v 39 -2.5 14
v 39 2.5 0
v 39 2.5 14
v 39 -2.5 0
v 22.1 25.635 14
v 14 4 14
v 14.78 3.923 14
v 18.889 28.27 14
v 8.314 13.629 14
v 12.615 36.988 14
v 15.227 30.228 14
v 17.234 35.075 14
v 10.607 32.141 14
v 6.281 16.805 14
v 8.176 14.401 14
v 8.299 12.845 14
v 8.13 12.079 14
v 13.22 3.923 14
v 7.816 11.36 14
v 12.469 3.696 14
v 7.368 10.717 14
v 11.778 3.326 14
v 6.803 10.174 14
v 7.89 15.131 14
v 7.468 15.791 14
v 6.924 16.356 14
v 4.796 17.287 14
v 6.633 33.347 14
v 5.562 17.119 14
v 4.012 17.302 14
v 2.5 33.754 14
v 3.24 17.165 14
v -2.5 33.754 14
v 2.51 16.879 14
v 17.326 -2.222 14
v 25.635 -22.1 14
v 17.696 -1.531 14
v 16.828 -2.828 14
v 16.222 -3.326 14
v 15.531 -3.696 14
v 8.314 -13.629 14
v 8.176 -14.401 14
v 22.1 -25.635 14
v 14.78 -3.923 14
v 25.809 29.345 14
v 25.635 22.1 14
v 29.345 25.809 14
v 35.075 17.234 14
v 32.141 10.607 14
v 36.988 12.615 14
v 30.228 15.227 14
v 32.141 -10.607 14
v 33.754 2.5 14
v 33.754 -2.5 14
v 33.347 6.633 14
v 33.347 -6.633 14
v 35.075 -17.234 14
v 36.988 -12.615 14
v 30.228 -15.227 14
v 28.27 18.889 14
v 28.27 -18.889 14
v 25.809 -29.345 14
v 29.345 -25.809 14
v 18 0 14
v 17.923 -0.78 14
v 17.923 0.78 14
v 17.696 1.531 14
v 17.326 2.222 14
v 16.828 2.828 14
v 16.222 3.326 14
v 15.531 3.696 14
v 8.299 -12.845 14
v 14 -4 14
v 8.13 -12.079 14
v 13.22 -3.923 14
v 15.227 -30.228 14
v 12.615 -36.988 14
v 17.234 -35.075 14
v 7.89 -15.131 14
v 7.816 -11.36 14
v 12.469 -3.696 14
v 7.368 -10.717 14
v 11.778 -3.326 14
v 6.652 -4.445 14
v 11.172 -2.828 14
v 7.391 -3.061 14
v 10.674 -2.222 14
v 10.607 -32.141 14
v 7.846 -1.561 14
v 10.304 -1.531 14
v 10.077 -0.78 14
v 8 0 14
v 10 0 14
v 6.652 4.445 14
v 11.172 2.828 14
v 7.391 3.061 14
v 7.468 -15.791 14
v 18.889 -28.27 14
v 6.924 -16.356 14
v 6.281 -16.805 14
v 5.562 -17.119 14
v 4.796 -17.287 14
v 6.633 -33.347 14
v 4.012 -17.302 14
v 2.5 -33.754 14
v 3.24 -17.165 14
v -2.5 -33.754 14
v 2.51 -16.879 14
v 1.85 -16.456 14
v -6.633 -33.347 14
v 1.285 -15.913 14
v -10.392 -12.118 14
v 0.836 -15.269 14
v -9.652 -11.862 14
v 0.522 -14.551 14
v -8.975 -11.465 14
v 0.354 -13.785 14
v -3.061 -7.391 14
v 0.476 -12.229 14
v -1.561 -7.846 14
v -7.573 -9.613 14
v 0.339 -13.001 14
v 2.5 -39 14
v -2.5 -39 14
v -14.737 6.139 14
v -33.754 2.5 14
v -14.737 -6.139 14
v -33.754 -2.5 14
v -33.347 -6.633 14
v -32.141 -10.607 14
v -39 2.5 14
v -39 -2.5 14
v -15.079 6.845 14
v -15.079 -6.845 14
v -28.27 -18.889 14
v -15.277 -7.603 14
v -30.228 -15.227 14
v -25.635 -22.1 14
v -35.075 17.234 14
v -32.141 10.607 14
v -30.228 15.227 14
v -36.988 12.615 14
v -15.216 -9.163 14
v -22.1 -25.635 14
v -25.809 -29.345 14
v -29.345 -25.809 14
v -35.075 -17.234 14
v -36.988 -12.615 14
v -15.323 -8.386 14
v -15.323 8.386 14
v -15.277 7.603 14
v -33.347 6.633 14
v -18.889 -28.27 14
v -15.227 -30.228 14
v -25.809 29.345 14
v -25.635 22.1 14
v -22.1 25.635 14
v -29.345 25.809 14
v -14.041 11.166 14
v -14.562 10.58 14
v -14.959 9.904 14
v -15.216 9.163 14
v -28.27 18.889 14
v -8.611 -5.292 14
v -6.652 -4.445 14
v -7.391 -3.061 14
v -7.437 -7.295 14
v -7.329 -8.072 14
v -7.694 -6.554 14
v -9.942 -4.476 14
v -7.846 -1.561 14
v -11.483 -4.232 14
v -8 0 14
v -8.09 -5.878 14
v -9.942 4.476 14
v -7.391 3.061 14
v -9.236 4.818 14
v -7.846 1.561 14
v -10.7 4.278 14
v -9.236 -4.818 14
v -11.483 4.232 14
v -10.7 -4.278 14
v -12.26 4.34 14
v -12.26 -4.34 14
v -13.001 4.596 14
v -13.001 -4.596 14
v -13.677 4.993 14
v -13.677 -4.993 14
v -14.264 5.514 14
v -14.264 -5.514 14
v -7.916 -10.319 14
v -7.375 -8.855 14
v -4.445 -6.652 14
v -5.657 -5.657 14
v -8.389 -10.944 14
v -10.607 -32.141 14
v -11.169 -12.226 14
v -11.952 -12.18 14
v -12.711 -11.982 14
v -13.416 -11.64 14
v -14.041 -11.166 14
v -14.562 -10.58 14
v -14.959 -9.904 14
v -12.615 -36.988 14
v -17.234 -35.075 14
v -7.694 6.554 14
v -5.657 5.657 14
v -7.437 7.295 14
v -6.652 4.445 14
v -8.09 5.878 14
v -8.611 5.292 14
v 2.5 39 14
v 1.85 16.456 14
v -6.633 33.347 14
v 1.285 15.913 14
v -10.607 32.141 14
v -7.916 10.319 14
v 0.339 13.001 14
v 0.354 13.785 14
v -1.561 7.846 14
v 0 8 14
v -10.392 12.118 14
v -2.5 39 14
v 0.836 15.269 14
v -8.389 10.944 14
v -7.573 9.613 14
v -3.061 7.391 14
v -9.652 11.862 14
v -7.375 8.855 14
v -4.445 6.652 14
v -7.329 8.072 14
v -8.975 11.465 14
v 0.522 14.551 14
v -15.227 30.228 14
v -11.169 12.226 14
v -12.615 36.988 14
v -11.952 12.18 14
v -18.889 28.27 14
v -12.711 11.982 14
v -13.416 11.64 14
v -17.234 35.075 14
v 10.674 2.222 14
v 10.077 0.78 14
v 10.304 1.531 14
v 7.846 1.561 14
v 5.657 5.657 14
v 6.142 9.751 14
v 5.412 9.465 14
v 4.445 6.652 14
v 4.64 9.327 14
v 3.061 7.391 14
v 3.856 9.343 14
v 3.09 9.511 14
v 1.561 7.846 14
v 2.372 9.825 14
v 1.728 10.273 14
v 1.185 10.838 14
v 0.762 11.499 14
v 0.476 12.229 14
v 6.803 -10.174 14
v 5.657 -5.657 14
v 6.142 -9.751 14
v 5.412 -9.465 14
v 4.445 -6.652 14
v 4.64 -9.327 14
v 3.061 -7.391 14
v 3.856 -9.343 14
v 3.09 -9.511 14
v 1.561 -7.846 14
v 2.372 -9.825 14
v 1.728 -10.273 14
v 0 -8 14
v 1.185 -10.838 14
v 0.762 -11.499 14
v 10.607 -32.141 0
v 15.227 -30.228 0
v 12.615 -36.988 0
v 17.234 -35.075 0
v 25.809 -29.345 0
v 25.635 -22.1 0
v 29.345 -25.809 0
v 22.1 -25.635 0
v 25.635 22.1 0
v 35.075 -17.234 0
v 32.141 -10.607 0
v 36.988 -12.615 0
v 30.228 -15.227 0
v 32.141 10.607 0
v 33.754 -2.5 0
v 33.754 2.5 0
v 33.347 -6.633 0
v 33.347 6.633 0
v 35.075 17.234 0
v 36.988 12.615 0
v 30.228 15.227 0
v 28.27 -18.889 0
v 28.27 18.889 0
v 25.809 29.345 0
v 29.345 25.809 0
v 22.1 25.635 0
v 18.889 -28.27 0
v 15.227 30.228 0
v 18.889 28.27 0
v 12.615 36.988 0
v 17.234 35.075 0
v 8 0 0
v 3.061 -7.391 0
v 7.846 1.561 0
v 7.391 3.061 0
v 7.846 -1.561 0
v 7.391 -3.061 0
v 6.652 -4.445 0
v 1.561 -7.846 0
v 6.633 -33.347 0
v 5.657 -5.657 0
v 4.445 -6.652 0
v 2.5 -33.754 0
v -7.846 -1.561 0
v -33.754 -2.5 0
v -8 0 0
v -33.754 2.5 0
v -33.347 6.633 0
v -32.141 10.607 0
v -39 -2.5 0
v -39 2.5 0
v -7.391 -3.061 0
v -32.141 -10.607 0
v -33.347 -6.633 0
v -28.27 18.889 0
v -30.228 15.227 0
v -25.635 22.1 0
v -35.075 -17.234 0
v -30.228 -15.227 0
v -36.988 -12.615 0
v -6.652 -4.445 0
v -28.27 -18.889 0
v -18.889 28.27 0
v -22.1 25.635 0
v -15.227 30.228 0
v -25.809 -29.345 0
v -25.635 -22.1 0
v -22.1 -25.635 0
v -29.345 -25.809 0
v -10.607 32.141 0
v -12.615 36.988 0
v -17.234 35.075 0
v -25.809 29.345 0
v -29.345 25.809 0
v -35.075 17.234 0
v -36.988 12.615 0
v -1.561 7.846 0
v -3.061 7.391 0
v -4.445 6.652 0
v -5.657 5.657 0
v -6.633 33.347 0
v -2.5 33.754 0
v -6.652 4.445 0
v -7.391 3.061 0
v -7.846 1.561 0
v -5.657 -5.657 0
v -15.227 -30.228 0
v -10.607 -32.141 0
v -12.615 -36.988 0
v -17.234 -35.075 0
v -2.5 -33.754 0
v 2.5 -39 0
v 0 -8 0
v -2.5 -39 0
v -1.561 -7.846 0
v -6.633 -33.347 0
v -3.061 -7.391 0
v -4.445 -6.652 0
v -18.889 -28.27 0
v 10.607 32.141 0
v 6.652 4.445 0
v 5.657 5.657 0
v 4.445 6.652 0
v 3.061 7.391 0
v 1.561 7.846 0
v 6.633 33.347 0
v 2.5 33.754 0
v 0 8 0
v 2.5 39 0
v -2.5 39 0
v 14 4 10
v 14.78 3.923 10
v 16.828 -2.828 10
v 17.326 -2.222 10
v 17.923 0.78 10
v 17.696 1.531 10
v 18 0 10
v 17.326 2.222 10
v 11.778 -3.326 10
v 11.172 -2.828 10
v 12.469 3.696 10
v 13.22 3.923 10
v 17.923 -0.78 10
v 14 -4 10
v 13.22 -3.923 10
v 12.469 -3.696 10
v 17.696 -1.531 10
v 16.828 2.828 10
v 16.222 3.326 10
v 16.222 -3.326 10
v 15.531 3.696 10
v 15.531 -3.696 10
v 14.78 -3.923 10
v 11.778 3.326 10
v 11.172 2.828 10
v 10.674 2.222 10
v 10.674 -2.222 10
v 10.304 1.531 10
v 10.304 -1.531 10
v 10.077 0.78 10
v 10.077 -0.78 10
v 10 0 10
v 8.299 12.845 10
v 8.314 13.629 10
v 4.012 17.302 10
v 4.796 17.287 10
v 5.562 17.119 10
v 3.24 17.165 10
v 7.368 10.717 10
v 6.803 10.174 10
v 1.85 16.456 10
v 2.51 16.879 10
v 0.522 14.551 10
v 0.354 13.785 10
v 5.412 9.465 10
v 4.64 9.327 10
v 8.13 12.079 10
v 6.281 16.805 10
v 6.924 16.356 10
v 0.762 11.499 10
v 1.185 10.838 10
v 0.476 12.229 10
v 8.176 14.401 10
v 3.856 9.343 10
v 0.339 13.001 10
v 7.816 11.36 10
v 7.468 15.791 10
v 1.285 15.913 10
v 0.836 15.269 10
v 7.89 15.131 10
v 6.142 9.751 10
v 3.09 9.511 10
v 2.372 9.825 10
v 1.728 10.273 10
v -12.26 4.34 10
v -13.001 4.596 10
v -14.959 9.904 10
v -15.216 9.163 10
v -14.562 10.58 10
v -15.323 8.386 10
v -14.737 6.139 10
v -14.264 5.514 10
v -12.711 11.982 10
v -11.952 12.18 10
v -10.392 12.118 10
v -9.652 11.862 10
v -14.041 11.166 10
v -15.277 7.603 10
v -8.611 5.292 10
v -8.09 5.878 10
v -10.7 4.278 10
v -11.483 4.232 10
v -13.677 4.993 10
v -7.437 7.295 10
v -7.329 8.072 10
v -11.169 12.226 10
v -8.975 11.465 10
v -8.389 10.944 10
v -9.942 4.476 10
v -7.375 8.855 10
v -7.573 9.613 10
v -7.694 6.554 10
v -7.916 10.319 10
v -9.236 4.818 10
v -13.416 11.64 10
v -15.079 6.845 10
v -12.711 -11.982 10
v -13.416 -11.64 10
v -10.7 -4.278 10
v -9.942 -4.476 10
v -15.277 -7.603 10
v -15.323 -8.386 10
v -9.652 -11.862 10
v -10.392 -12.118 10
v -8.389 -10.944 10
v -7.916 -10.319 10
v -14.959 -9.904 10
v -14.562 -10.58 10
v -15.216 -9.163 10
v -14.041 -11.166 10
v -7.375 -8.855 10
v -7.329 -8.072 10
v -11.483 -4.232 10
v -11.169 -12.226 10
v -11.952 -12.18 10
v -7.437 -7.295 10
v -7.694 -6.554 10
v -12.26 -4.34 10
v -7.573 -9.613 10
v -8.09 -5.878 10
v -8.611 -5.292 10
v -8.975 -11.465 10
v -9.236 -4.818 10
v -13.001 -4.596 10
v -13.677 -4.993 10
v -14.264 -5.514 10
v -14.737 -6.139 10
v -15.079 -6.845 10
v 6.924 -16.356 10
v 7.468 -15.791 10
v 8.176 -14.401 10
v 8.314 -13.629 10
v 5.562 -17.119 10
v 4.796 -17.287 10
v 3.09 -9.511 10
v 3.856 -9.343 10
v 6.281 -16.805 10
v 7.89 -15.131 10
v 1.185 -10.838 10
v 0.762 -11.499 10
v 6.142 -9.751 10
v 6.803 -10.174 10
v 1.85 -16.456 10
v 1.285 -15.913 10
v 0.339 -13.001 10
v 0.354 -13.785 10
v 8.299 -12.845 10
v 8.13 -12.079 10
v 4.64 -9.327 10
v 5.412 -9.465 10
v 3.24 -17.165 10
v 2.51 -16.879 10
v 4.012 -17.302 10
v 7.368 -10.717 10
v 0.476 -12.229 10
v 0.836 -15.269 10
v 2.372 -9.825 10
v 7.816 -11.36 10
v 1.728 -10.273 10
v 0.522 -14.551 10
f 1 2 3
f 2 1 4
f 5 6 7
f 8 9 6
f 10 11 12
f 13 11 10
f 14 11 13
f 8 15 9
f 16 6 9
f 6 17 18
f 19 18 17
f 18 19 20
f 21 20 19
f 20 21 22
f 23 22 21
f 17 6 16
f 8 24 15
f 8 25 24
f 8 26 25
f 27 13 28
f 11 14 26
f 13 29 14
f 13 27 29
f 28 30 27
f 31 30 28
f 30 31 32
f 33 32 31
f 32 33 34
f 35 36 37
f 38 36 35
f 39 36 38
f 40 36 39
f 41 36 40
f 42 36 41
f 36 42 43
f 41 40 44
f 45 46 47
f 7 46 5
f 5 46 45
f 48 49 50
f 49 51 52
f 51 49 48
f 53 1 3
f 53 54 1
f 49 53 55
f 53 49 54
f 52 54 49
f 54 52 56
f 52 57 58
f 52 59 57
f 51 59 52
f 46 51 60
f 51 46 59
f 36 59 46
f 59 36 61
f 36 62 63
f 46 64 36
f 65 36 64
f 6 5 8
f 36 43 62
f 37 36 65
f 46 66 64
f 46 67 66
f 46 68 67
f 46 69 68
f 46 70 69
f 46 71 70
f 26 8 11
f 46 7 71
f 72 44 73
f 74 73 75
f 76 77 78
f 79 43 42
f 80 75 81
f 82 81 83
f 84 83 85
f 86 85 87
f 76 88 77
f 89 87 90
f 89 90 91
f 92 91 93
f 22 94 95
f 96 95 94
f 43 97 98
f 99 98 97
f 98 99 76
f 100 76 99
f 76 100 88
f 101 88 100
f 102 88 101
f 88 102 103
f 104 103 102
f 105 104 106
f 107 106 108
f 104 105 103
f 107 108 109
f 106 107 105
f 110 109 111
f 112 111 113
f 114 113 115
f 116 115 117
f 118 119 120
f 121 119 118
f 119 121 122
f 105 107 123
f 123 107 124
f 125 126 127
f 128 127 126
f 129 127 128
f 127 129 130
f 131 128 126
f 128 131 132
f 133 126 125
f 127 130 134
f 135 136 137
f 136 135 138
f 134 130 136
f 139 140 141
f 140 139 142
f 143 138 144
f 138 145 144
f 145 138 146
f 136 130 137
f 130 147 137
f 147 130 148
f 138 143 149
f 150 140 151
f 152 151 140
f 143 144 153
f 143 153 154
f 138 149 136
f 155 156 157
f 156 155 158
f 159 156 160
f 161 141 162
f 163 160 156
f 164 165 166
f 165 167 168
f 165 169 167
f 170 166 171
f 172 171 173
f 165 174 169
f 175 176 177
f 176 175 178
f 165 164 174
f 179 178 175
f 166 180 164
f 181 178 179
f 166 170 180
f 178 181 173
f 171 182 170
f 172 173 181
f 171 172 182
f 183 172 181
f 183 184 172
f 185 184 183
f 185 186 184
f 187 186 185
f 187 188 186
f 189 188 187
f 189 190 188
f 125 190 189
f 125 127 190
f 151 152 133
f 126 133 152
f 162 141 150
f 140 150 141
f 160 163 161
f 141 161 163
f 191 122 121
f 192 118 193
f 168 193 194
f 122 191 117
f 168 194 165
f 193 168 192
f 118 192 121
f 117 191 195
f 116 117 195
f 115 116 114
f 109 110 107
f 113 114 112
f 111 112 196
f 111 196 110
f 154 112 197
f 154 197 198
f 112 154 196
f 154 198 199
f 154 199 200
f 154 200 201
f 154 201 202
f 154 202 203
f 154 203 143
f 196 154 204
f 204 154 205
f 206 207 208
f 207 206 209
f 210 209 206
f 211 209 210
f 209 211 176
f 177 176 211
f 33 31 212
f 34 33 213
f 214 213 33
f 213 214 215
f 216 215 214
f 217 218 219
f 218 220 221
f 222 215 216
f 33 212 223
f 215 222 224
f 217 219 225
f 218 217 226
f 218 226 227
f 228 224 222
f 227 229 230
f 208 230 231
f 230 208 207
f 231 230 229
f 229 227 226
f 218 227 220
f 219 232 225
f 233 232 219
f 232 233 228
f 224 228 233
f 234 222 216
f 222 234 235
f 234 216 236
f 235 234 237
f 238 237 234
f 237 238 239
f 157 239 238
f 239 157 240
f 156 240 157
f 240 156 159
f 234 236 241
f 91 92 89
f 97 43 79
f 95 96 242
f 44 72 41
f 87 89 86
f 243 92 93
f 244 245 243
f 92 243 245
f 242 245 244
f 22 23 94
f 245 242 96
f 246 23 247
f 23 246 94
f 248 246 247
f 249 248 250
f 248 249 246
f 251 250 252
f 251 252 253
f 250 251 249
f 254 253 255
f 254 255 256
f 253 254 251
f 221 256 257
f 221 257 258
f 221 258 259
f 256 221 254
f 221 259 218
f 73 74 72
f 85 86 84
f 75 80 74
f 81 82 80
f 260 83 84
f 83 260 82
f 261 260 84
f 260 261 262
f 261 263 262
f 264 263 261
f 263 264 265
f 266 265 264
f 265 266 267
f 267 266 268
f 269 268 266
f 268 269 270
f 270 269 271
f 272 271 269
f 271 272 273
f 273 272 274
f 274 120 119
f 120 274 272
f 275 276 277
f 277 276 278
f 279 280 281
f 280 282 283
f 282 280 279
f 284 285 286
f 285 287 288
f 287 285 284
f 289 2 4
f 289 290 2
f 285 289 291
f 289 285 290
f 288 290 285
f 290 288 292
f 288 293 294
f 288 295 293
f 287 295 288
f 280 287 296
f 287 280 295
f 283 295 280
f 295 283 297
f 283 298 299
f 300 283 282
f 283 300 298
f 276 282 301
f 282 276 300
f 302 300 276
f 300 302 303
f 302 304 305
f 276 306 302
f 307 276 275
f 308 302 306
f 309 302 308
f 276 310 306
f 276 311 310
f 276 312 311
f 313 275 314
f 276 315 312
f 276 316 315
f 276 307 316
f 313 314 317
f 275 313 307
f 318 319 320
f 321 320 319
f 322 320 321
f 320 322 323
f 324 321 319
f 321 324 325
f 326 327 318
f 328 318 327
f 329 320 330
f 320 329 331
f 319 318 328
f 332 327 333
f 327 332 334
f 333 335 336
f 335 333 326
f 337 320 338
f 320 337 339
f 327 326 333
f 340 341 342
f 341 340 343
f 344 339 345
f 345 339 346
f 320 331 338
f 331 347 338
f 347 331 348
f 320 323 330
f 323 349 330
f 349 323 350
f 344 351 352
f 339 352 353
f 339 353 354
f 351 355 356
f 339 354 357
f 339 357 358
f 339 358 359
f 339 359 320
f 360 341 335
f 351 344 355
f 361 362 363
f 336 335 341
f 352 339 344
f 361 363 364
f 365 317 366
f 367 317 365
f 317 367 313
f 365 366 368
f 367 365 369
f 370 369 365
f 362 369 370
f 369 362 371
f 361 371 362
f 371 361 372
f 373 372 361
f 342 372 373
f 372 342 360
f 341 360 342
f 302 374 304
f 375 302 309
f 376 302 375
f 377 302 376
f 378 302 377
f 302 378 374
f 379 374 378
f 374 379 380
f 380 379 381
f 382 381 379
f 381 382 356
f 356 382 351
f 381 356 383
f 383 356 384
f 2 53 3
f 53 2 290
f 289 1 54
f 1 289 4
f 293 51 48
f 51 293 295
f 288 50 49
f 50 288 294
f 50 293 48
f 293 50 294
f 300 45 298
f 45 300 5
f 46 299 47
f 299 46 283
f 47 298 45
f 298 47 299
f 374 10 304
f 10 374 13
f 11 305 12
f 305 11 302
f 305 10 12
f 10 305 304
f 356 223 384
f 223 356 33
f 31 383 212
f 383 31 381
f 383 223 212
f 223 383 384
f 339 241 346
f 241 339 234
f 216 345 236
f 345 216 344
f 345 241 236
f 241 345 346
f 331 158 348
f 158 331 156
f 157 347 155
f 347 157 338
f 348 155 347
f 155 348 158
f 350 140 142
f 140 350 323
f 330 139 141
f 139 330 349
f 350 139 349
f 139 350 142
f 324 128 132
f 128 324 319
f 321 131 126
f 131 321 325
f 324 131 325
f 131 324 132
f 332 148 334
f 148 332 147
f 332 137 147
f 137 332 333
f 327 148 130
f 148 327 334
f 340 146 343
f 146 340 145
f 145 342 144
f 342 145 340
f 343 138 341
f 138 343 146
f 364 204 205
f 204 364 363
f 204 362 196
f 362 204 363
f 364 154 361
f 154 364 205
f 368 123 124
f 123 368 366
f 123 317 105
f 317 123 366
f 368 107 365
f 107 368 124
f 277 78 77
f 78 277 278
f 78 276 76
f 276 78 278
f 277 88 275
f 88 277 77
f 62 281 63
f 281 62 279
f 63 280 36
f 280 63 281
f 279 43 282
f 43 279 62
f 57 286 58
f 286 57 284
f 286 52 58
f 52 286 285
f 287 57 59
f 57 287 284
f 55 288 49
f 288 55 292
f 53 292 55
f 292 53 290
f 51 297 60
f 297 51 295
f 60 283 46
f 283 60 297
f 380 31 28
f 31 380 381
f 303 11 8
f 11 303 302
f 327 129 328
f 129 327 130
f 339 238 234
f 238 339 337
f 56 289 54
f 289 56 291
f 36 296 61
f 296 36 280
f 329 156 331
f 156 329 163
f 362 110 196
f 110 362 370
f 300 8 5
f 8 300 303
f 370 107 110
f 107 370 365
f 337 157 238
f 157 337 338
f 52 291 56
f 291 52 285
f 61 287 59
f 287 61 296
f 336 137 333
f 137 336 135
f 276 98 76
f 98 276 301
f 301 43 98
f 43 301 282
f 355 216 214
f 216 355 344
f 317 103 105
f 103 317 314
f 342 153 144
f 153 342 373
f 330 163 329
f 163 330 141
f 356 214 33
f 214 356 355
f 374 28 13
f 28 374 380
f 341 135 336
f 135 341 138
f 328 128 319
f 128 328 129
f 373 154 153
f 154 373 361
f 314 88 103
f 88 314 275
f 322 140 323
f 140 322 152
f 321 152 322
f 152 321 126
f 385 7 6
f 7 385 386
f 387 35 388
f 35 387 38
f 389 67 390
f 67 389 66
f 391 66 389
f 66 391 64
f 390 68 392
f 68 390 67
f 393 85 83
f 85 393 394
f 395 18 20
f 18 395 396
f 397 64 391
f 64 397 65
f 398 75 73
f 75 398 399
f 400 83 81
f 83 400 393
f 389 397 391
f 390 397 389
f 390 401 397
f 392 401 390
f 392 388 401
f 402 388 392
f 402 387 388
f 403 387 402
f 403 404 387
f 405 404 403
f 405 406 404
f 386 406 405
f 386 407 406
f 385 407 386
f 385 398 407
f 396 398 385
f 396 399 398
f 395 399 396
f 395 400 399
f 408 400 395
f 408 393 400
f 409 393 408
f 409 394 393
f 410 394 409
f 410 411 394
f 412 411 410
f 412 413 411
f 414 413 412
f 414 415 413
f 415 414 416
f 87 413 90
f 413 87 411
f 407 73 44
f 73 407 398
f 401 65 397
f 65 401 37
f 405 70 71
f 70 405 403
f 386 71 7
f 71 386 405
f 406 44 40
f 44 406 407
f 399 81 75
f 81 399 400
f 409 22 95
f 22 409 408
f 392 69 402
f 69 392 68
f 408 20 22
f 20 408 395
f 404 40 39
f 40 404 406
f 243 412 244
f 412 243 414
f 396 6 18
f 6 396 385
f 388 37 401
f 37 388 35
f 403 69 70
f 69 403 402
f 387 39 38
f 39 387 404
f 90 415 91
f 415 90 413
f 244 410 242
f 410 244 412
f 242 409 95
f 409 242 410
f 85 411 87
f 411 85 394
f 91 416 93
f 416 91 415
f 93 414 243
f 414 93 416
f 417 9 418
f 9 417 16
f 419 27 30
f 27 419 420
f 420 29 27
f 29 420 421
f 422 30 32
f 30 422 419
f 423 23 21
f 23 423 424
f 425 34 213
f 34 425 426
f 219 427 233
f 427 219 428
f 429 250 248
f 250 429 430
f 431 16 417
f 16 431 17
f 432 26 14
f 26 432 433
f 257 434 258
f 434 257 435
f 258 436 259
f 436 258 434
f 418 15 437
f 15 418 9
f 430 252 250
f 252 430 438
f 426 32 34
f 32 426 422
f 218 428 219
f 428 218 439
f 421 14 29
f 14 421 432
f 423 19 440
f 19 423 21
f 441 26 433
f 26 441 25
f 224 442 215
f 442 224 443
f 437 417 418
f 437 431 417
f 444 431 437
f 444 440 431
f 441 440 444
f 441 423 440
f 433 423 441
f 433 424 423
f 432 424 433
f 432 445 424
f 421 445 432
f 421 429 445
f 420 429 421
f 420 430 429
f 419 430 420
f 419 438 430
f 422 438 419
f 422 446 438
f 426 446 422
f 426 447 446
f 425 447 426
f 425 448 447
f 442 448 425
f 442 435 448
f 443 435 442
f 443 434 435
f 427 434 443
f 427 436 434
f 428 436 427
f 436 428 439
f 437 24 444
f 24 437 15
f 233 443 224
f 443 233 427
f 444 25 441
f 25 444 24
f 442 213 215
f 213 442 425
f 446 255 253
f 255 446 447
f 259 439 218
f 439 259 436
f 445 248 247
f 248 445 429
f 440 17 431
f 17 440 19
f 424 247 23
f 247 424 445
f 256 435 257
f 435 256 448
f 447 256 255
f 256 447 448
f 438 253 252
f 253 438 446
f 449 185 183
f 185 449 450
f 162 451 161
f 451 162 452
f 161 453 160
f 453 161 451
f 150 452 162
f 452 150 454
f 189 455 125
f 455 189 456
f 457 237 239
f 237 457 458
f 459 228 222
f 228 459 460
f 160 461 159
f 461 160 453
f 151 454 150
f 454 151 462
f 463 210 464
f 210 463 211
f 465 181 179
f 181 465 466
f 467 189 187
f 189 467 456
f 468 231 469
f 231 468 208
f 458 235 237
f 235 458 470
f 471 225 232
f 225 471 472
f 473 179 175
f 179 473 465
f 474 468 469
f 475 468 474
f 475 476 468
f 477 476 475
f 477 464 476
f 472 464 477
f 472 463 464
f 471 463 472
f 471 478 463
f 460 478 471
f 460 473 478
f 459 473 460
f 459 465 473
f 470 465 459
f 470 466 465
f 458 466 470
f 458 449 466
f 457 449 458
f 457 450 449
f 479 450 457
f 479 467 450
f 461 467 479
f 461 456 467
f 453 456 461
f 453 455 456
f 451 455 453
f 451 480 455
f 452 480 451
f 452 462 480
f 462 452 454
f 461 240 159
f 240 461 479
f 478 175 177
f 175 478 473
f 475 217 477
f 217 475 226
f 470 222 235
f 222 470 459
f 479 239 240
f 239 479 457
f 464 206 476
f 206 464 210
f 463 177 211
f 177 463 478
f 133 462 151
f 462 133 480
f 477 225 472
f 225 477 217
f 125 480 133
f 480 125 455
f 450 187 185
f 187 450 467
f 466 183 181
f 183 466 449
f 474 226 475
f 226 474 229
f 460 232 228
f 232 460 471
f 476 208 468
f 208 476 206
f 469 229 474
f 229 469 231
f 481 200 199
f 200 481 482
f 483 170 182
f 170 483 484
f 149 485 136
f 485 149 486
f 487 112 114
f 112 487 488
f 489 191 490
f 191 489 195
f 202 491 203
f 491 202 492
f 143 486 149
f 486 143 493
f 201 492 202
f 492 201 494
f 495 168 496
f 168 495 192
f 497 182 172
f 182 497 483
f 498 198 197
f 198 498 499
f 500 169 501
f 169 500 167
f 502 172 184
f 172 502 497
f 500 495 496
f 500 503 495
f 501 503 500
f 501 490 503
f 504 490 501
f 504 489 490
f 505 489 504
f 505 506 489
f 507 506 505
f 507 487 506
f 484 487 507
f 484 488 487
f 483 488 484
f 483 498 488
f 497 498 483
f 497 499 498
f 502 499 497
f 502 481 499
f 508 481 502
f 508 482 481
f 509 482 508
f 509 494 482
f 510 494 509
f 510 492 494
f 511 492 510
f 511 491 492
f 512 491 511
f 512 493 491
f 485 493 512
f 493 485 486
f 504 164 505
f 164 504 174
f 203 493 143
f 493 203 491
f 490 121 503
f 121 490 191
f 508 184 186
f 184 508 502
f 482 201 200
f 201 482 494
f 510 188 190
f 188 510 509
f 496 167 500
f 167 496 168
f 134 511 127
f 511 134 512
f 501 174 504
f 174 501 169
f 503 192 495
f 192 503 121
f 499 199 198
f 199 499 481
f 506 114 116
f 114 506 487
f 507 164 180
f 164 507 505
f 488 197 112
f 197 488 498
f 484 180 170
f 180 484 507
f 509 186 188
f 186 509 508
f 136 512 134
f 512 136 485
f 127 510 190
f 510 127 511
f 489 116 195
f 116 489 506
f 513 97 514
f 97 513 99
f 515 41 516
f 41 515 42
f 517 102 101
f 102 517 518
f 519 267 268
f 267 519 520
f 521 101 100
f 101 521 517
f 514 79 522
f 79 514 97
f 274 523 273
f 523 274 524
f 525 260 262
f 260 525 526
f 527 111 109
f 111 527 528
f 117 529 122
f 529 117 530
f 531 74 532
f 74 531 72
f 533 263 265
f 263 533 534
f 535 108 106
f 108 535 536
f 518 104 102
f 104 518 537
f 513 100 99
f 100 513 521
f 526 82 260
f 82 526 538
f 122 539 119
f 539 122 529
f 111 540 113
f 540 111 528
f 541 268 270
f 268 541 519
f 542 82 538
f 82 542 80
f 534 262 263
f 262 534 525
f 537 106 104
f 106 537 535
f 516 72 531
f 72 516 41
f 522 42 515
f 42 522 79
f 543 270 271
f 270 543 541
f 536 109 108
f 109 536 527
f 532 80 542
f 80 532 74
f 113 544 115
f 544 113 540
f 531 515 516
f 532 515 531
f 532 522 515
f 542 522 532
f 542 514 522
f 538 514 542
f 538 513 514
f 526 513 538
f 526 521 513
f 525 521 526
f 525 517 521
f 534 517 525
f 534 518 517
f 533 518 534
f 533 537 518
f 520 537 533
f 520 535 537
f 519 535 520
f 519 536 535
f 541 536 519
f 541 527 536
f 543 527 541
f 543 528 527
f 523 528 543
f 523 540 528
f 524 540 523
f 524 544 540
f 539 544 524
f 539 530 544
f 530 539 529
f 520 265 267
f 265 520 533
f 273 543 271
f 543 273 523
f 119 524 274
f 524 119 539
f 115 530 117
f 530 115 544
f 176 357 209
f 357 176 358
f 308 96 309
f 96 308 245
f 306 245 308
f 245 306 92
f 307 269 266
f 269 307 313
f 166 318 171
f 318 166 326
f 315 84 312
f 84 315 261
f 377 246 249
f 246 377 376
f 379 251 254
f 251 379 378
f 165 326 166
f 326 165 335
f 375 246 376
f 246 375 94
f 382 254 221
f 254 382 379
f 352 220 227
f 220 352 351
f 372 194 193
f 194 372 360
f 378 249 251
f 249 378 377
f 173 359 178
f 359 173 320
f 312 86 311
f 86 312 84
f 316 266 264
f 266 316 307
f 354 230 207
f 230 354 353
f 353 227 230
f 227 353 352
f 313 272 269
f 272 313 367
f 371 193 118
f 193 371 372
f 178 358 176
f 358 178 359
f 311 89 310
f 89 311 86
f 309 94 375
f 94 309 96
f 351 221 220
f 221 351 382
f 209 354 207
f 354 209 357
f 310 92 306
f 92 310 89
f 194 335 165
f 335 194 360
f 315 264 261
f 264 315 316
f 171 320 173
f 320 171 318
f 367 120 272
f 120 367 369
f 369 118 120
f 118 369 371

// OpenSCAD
$fn = 32;

// ----------------------------------------------------------------------
// Spur blank: lightened gear blank
// ----------------------------------------------------------------------

// --- parameters (mm) ---
disc_r = 34;              // blank root radius
disc_t = 14;              // blank thickness
n_teeth = 16;             // stub tooth count
tooth_w = 5;              // tooth width at the root
tooth_h = 5;              // tooth height above the root
bore_r = 8;               // central bore radius
ring_r = 14;              // lightening pocket ring radius
pocket_r = 4;             // lightening pocket radius

out_r = disc_r + tooth_h;  // tip radius
bbox_x = 78.0;  // measured width over the teeth
bbox_y = 78.0;  // measured depth over the teeth

difference() {
union() {
  cylinder(r = disc_r, h = disc_t);
  for (i = [0 : n_teeth - 1])
    rotate([0, 0, i * 360 / n_teeth])
      translate([disc_r - 1, -tooth_w / 2, 0])
        cube([tooth_h + 1, tooth_w, disc_t]);
}
  translate([0, 0, -1]) cylinder(r = bore_r, h = disc_t + 2);
  for (i = [0 : 5])
    rotate([0, 0, i * 72])
      translate([ring_r, 0, disc_t - 4])
        cylinder(r = pocket_r, h = 5);
}
